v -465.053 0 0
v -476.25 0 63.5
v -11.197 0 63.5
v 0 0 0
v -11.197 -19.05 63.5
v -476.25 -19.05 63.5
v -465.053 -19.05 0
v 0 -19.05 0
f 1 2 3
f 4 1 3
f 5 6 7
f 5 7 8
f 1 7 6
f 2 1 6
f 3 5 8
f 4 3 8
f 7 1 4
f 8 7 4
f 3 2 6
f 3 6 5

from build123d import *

# Parameters (mm, degrees)
F0_W     = 476.25
F0_H     = 63.5
F1_DEPTH = 19.05
F3_DEPTH = 25.4
F5_DEPTH = 25.4


with BuildPart() as f1:
    # F0 (on Front) → F1 (new body)
    with BuildSketch(Plane.XZ):
        with Locations((-238.125, 31.75)):
            Rectangle(F0_W, F0_H)
    extrude(amount=F1_DEPTH)

    # F2 (on face) → F3 (cut)
    with BuildSketch(Plane.XZ.offset(19.05)):
        Polygon((-465.053237, 0), (-476.25, 63.5), (-476.25, 0), align=None)
    extrude(amount=-F3_DEPTH, mode=Mode.SUBTRACT)

    # F4 (on face) → F5 (cut)
    with BuildSketch(Plane.XZ.offset(19.05)):
        Polygon((-11.196763, 63.5), (0, 0), (0, 63.5), align=None)
    extrude(amount=-F5_DEPTH, mode=Mode.SUBTRACT)


solid = f1.part
